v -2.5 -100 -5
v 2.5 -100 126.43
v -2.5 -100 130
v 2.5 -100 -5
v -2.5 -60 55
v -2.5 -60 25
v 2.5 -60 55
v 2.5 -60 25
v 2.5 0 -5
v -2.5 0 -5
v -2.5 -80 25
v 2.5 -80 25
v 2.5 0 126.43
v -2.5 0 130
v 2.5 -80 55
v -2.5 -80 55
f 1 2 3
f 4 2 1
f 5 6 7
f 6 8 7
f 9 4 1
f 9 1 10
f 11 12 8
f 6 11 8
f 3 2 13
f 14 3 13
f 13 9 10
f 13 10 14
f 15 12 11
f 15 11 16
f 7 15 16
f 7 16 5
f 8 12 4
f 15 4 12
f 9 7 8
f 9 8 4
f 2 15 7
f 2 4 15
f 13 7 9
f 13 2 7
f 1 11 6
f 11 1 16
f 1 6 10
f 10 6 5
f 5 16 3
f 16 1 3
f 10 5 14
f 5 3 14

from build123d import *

# Parameters (mm, degrees)
F0_W     = 100
F0_H     = 80
F0_W_2   = 20
F0_H_2   = 30
F0_H_3   = 50
F0_H_4   = 5
F1_DEPTH = 2.5
F2_SIZE2 = 3.570407
F2_SIZE  = 4.99999


# Not quite as in the source:
# - a fillet or chamfer is up to 0.001 mm smaller than in the source, because OpenCascade refuses the exact size


with BuildPart() as f1:
    # F0 (on Right) → F1 (new body, symmetric)
    with BuildSketch(Plane.YZ):
        with Locations((-50, 40)):
            Rectangle(F0_W, F0_H)
        with Locations((-70, 40)):
            Rectangle(F0_W_2, F0_H_2, mode=Mode.SUBTRACT)
        with Locations((-50, 105)):
            Rectangle(F0_W, F0_H_3)
        with Locations((-50, -2.5)):
            Rectangle(F0_W, F0_H_4)
    extrude(amount=F1_DEPTH, both=True)

    # F2 (size 5 and 3.5704168108 in the source; OpenCascade refuses exactly that, so slightly less here)
    f2_edges = [f1.edges().sort_by_distance(p)[0] for p in [
        (2.5, -50, 130),
    ]]
    f2_side = f1.faces().sort_by_distance((0, -50, 130))[0]
    chamfer(f2_edges, length=F2_SIZE, length2=F2_SIZE2, reference=f2_side)


solid = f1.part
